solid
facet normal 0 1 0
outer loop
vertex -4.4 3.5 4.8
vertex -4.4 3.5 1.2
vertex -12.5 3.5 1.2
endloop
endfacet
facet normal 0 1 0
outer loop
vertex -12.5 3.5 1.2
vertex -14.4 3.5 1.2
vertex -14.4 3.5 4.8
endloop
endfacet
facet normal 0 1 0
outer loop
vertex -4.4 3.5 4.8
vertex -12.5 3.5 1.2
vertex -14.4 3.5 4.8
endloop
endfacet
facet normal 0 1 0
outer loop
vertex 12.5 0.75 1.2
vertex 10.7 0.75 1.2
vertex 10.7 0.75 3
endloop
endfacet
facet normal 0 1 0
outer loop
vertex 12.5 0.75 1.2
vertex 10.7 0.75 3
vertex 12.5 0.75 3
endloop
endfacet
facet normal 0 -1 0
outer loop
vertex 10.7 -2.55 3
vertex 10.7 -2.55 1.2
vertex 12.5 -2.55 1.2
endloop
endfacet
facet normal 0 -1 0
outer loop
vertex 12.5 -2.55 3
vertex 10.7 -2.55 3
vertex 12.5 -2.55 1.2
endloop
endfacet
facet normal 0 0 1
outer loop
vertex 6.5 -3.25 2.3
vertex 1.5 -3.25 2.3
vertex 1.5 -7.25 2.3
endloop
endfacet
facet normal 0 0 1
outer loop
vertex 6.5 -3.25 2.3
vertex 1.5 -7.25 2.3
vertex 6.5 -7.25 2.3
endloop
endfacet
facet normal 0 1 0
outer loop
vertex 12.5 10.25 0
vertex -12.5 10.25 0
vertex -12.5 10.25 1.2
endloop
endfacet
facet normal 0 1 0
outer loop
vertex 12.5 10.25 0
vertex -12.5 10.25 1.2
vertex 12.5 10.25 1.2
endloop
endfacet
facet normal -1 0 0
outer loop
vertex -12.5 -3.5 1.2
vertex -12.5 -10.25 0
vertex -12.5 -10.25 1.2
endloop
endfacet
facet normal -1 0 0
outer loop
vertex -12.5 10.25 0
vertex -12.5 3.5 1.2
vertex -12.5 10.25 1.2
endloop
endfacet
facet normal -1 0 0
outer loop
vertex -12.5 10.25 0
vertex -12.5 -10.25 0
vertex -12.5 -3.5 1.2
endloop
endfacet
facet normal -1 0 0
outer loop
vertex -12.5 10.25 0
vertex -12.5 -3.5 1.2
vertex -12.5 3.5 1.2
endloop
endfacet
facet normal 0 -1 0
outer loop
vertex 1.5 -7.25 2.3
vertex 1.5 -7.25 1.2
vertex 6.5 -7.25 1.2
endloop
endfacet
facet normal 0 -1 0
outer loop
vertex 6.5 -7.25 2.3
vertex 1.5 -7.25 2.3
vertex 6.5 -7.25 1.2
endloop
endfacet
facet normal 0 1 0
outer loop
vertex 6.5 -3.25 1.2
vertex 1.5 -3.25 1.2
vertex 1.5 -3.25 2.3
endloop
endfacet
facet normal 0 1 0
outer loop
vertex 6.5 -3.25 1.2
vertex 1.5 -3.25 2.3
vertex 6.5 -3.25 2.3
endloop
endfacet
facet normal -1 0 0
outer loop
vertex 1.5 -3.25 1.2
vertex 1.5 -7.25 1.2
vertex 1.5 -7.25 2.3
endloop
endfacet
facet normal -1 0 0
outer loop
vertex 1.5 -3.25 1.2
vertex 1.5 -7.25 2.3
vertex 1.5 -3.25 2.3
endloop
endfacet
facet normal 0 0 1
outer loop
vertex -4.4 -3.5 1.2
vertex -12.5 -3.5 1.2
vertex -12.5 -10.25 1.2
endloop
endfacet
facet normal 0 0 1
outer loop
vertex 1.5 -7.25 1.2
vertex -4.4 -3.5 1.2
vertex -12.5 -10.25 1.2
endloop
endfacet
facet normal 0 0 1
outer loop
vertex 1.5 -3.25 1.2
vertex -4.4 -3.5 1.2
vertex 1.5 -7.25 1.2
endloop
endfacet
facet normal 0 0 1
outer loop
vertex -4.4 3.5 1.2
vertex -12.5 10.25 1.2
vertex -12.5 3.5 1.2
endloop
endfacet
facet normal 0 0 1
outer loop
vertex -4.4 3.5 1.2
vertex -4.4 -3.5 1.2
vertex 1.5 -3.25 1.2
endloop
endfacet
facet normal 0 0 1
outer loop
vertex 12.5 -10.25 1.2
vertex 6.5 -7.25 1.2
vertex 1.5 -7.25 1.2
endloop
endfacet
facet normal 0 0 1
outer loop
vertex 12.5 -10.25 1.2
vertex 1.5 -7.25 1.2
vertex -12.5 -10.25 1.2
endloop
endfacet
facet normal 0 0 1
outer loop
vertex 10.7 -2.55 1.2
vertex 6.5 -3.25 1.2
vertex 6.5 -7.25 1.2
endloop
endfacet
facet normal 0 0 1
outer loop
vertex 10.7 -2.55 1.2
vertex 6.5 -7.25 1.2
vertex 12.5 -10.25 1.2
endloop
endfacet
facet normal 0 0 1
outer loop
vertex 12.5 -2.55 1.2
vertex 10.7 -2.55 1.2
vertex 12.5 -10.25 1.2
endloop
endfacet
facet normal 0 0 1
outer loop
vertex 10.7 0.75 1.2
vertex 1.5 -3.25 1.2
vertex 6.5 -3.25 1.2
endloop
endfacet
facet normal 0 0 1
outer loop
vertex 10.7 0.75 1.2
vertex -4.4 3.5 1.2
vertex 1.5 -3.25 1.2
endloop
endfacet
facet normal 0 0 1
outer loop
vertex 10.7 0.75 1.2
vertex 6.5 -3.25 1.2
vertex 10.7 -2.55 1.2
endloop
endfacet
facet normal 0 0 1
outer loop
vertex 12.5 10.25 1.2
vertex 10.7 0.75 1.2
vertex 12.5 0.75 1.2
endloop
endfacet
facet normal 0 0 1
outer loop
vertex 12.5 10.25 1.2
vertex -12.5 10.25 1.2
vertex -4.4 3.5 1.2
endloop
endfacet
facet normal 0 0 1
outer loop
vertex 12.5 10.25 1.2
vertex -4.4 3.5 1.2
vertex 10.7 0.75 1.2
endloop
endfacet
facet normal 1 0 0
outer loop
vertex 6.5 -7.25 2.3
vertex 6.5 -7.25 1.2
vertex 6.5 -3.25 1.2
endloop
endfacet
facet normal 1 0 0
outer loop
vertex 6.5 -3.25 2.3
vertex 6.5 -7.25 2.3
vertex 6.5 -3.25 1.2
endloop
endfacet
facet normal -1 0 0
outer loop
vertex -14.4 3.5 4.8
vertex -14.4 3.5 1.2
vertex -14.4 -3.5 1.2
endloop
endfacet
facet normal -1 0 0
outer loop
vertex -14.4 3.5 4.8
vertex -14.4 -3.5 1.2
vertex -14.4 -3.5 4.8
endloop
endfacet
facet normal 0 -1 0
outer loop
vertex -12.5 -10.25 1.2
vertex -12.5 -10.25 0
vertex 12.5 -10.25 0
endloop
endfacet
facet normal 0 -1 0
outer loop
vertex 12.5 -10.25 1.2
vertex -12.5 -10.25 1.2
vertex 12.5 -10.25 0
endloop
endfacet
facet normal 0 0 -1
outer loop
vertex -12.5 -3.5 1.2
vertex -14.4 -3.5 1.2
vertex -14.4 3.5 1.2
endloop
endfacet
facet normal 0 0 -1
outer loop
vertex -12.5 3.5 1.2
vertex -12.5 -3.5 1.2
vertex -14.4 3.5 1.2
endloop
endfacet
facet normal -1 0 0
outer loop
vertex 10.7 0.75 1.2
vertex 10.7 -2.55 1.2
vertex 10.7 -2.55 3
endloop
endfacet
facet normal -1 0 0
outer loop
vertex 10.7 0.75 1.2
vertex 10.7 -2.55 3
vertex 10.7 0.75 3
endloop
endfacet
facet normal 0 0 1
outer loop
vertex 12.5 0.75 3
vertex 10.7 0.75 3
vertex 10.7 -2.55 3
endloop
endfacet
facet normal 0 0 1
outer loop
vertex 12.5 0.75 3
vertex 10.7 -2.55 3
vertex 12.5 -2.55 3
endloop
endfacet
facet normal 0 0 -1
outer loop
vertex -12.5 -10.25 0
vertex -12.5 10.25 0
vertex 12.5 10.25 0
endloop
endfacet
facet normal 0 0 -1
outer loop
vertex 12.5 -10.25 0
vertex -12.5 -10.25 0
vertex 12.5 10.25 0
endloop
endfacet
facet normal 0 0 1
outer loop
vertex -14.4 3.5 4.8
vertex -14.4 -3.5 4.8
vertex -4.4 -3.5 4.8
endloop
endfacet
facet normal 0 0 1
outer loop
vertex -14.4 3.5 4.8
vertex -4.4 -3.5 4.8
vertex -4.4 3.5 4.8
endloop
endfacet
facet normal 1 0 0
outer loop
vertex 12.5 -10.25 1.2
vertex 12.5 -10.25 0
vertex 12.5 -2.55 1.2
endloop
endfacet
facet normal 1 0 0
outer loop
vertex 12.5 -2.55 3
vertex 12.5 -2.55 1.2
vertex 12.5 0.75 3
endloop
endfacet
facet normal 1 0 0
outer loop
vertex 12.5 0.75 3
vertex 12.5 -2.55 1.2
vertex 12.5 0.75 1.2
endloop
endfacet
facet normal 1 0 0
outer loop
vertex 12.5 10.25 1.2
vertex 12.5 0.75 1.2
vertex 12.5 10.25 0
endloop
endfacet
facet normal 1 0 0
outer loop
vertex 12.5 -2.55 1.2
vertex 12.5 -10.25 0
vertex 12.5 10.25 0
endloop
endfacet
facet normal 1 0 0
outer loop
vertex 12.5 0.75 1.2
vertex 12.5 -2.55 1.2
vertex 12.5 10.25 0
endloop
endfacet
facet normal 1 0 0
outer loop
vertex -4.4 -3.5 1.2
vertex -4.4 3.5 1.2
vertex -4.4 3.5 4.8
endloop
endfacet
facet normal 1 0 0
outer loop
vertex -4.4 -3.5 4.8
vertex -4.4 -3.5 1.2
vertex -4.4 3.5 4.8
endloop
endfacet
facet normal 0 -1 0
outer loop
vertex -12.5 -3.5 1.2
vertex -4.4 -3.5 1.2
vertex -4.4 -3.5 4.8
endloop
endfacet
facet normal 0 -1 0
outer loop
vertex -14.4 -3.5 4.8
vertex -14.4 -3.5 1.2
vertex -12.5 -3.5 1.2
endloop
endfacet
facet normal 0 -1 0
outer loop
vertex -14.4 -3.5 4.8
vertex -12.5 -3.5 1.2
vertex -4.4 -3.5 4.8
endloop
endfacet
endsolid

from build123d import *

# Parameters (mm, degrees)
SKETCH1_W            = 25
SKETCH1_H            = 20.5
BOSS_EXTRUDE1_DEPTH  = 1.2
USB_START            = 1.9
SKETCH2_W            = 3.6
SKETCH2_H            = 7
USB_CONNECTOR_DEPTH  = 10
SKETCH3_W            = 1.8
SKETCH3_H            = 3.3
MICROPROCESSOR_DEPTH = 1.8
SKETCH4_W            = 5
SKETCH4_H            = 4
BUTTON_BASE_DEPTH    = 1.1


with BuildPart() as part:
    # Sketch1 → Boss-Extrude1 (new body)
    with BuildSketch(Plane.XY):
        Rectangle(SKETCH1_W, SKETCH1_H)
    extrude(amount=BOSS_EXTRUDE1_DEPTH)

    # Sketch2 → USB Connector (add)
    with BuildSketch(Plane.ZY.offset(12.5).offset(USB_START)):
        with Locations((3, 0)):
            Rectangle(SKETCH2_W, SKETCH2_H)
    extrude(amount=-USB_CONNECTOR_DEPTH)

    # Sketch3 → MicroProcessor (add)
    with BuildSketch(Plane.XY.offset(1.2)):
        with Locations((11.6, -0.9)):
            Rectangle(SKETCH3_W, SKETCH3_H)
    extrude(amount=MICROPROCESSOR_DEPTH)

    # Sketch4 → Button Base (add)
    with BuildSketch(Plane.XY.offset(1.2)):
        with Locations((4, -5.25)):
            Rectangle(SKETCH4_W, SKETCH4_H)
    extrude(amount=BUTTON_BASE_DEPTH)


solid = part.part
